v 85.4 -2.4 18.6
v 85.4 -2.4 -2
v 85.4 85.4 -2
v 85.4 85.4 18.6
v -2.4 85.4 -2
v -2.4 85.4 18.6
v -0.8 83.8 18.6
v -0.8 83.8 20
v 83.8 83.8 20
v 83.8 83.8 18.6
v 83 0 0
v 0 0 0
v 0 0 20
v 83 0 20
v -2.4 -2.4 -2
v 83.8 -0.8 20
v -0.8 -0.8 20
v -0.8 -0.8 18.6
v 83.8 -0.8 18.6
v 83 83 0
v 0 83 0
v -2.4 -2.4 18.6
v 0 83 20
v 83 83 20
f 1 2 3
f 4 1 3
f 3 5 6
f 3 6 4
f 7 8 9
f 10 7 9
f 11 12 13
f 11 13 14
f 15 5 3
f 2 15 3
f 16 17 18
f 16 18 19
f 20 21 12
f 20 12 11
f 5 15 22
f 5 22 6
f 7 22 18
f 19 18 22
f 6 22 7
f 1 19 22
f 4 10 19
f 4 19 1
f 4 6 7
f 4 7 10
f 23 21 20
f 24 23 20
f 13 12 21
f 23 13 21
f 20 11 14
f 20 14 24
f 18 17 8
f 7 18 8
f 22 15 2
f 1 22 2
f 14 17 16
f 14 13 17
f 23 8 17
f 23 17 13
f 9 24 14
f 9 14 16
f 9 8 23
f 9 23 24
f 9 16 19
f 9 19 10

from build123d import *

# Parameters (mm, degrees)
SKETCH1_W           = 87.8
SKETCH1_H           = 87.8
BOSS_EXTRUDE1_DEPTH = 2
SKETCH1_3_W         = 87.8
SKETCH1_3_H         = 87.8
SKETCH1_3_W_2       = 83
SKETCH1_3_H_2       = 83
BOSS_EXTRUDE2_DEPTH = 20
SKETCH2_OUTSIDE_W   = 115.02
SKETCH2_OUTSIDE_H   = 115.02
SKETCH2_OUTSIDE_W_2 = 84.6
SKETCH2_OUTSIDE_H_2 = 84.6
CUT_EXTRUDE1_DEPTH  = 1.4


with BuildPart() as part:
    # Sketch1 → Boss-Extrude1 (new body)
    with BuildSketch(Plane.XY):
        with Locations((41.5, 41.5)):
            Rectangle(SKETCH1_W, SKETCH1_H)
    extrude(amount=-BOSS_EXTRUDE1_DEPTH)

    # Sketch1<3> → Boss-Extrude2 (add)
    with BuildSketch(Plane.XY):
        with Locations((41.5, 41.5)):
            Rectangle(SKETCH1_3_W, SKETCH1_3_H)
        with Locations((41.5, 41.5)):
            Rectangle(SKETCH1_3_W_2, SKETCH1_3_H_2, mode=Mode.SUBTRACT)
    extrude(amount=BOSS_EXTRUDE2_DEPTH)

    # Sketch2 outside → Cut-Extrude1 (cut)
    with BuildSketch(Plane.XY.offset(20)):
        with Locations((41.5, 41.5)):
            Rectangle(SKETCH2_OUTSIDE_W, SKETCH2_OUTSIDE_H)
        with Locations((41.5, 41.5)):
            Rectangle(SKETCH2_OUTSIDE_W_2, SKETCH2_OUTSIDE_H_2, mode=Mode.SUBTRACT)
    extrude(amount=-CUT_EXTRUDE1_DEPTH, mode=Mode.SUBTRACT)


solid = part.part
